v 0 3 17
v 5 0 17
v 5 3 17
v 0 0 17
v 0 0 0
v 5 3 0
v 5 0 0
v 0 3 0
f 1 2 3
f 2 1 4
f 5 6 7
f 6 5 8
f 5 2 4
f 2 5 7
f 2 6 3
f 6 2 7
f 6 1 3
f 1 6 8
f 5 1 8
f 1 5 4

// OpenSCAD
// Generated by SolidPython 1.0.1 on 2020-07-29 00:46:54


cube(size = [5, 3, 17]);
/***********************************************
*********      SolidPython code:      **********
************************************************
 
# import packages: SolidPython
from solid import *
from solid.utils import *
from itertools import chain, combinations, permutations


class Resize:

    def __init__(self, scad_file):
        self.scad_file = scad_file
        #self.scad_file = import_scad(scad_file)
        # cone/cylinder param:
        self.r1 = 0
        self.r2 = 0
        self.h = 0
        # rectangular prism param:
        self.w = 0
        self.l = 0
        # ellipse param:
        self.r = 0

    # import OpenScad code (file name corresponds to shape)


    # classify shape + parameters
    def assign(self, param1, param2, param3):
        if self.scad_file == 'cone.scad':
            self.r1 = param1
            self.r2 = param2
            self.h = param3
        elif self.scad_file == 'cylinder.scad':
            self.r1 = param1
            self.r2 = param2
            self.h = param3
        elif self.scad_file == 'rectangularPrism.scad':
            self.h = param1
            self.l = param2
            self.w = param3
        else:
            self.r = param1
            self.h = param2

    # resize parameters
    def iterate(self):
        x = range(3, 20, 2)
        i = 1
        if self.scad_file == 'cone.scad':
            tempList = list(permutations(x, 2))
            for temp in tempList:
                param1 = temp[0]
                param2 = temp[1]
                filepath = 'produced_scad_files/' + 'cone' + str(param1) + '_' + str(param2) + '_' + '.scad'
                scad_render_to_file(cylinder(h=param1, r1=param2, r2=0), filepath)

        elif self.scad_file == 'cylinder.scad':
            tempList = list(permutations(x, 3))
            for temp in tempList:
                param1 = temp[0]
                param2 = temp[1]
                filepath = 'produced_scad_files/' + 'cylinder' + str(param1) + '_' + str(param2) + '_' + '.scad'
                scad_render_to_file(cylinder(h=param1, r1=param2, r2=param2), filepath)

        elif self.scad_file == 'rectangularPrism.scad':
            tempList = list(permutations(x, 3))
            for temp in tempList:
                param1 = temp[0]
                param2 = temp[1]
                param3 = temp[2]
                filepath = 'produced_scad_files/' + 'rectangularPrism' + str(param1) + '_' + str(param2) + '_' + str(
                    param3) + '.scad'
                scad_render_to_file(cube(size=(param1, param2, param3)), filepath)

        elif self.scad_file == 'ellipse.scad':
            tempList = list(permutations(x, 4))
            for temp in tempList:
                param1 = temp[0]
                param2 = temp[1]
                param3 = temp[2]
                param4 = temp[3]
                filepath = 'produced_scad_files/' + 'ellipse' + str(param1) + '_' + str(param2) + '_' + str(param3) + '_' + str(param4) + '.scad'
                scad_render_to_file(scale([param1, param2, param3])(sphere(r=param4)), filepath)

    def render_to_scadfile(self):
        scad_render_to_file(scad, 'example.scad') 
 
************************************************/
